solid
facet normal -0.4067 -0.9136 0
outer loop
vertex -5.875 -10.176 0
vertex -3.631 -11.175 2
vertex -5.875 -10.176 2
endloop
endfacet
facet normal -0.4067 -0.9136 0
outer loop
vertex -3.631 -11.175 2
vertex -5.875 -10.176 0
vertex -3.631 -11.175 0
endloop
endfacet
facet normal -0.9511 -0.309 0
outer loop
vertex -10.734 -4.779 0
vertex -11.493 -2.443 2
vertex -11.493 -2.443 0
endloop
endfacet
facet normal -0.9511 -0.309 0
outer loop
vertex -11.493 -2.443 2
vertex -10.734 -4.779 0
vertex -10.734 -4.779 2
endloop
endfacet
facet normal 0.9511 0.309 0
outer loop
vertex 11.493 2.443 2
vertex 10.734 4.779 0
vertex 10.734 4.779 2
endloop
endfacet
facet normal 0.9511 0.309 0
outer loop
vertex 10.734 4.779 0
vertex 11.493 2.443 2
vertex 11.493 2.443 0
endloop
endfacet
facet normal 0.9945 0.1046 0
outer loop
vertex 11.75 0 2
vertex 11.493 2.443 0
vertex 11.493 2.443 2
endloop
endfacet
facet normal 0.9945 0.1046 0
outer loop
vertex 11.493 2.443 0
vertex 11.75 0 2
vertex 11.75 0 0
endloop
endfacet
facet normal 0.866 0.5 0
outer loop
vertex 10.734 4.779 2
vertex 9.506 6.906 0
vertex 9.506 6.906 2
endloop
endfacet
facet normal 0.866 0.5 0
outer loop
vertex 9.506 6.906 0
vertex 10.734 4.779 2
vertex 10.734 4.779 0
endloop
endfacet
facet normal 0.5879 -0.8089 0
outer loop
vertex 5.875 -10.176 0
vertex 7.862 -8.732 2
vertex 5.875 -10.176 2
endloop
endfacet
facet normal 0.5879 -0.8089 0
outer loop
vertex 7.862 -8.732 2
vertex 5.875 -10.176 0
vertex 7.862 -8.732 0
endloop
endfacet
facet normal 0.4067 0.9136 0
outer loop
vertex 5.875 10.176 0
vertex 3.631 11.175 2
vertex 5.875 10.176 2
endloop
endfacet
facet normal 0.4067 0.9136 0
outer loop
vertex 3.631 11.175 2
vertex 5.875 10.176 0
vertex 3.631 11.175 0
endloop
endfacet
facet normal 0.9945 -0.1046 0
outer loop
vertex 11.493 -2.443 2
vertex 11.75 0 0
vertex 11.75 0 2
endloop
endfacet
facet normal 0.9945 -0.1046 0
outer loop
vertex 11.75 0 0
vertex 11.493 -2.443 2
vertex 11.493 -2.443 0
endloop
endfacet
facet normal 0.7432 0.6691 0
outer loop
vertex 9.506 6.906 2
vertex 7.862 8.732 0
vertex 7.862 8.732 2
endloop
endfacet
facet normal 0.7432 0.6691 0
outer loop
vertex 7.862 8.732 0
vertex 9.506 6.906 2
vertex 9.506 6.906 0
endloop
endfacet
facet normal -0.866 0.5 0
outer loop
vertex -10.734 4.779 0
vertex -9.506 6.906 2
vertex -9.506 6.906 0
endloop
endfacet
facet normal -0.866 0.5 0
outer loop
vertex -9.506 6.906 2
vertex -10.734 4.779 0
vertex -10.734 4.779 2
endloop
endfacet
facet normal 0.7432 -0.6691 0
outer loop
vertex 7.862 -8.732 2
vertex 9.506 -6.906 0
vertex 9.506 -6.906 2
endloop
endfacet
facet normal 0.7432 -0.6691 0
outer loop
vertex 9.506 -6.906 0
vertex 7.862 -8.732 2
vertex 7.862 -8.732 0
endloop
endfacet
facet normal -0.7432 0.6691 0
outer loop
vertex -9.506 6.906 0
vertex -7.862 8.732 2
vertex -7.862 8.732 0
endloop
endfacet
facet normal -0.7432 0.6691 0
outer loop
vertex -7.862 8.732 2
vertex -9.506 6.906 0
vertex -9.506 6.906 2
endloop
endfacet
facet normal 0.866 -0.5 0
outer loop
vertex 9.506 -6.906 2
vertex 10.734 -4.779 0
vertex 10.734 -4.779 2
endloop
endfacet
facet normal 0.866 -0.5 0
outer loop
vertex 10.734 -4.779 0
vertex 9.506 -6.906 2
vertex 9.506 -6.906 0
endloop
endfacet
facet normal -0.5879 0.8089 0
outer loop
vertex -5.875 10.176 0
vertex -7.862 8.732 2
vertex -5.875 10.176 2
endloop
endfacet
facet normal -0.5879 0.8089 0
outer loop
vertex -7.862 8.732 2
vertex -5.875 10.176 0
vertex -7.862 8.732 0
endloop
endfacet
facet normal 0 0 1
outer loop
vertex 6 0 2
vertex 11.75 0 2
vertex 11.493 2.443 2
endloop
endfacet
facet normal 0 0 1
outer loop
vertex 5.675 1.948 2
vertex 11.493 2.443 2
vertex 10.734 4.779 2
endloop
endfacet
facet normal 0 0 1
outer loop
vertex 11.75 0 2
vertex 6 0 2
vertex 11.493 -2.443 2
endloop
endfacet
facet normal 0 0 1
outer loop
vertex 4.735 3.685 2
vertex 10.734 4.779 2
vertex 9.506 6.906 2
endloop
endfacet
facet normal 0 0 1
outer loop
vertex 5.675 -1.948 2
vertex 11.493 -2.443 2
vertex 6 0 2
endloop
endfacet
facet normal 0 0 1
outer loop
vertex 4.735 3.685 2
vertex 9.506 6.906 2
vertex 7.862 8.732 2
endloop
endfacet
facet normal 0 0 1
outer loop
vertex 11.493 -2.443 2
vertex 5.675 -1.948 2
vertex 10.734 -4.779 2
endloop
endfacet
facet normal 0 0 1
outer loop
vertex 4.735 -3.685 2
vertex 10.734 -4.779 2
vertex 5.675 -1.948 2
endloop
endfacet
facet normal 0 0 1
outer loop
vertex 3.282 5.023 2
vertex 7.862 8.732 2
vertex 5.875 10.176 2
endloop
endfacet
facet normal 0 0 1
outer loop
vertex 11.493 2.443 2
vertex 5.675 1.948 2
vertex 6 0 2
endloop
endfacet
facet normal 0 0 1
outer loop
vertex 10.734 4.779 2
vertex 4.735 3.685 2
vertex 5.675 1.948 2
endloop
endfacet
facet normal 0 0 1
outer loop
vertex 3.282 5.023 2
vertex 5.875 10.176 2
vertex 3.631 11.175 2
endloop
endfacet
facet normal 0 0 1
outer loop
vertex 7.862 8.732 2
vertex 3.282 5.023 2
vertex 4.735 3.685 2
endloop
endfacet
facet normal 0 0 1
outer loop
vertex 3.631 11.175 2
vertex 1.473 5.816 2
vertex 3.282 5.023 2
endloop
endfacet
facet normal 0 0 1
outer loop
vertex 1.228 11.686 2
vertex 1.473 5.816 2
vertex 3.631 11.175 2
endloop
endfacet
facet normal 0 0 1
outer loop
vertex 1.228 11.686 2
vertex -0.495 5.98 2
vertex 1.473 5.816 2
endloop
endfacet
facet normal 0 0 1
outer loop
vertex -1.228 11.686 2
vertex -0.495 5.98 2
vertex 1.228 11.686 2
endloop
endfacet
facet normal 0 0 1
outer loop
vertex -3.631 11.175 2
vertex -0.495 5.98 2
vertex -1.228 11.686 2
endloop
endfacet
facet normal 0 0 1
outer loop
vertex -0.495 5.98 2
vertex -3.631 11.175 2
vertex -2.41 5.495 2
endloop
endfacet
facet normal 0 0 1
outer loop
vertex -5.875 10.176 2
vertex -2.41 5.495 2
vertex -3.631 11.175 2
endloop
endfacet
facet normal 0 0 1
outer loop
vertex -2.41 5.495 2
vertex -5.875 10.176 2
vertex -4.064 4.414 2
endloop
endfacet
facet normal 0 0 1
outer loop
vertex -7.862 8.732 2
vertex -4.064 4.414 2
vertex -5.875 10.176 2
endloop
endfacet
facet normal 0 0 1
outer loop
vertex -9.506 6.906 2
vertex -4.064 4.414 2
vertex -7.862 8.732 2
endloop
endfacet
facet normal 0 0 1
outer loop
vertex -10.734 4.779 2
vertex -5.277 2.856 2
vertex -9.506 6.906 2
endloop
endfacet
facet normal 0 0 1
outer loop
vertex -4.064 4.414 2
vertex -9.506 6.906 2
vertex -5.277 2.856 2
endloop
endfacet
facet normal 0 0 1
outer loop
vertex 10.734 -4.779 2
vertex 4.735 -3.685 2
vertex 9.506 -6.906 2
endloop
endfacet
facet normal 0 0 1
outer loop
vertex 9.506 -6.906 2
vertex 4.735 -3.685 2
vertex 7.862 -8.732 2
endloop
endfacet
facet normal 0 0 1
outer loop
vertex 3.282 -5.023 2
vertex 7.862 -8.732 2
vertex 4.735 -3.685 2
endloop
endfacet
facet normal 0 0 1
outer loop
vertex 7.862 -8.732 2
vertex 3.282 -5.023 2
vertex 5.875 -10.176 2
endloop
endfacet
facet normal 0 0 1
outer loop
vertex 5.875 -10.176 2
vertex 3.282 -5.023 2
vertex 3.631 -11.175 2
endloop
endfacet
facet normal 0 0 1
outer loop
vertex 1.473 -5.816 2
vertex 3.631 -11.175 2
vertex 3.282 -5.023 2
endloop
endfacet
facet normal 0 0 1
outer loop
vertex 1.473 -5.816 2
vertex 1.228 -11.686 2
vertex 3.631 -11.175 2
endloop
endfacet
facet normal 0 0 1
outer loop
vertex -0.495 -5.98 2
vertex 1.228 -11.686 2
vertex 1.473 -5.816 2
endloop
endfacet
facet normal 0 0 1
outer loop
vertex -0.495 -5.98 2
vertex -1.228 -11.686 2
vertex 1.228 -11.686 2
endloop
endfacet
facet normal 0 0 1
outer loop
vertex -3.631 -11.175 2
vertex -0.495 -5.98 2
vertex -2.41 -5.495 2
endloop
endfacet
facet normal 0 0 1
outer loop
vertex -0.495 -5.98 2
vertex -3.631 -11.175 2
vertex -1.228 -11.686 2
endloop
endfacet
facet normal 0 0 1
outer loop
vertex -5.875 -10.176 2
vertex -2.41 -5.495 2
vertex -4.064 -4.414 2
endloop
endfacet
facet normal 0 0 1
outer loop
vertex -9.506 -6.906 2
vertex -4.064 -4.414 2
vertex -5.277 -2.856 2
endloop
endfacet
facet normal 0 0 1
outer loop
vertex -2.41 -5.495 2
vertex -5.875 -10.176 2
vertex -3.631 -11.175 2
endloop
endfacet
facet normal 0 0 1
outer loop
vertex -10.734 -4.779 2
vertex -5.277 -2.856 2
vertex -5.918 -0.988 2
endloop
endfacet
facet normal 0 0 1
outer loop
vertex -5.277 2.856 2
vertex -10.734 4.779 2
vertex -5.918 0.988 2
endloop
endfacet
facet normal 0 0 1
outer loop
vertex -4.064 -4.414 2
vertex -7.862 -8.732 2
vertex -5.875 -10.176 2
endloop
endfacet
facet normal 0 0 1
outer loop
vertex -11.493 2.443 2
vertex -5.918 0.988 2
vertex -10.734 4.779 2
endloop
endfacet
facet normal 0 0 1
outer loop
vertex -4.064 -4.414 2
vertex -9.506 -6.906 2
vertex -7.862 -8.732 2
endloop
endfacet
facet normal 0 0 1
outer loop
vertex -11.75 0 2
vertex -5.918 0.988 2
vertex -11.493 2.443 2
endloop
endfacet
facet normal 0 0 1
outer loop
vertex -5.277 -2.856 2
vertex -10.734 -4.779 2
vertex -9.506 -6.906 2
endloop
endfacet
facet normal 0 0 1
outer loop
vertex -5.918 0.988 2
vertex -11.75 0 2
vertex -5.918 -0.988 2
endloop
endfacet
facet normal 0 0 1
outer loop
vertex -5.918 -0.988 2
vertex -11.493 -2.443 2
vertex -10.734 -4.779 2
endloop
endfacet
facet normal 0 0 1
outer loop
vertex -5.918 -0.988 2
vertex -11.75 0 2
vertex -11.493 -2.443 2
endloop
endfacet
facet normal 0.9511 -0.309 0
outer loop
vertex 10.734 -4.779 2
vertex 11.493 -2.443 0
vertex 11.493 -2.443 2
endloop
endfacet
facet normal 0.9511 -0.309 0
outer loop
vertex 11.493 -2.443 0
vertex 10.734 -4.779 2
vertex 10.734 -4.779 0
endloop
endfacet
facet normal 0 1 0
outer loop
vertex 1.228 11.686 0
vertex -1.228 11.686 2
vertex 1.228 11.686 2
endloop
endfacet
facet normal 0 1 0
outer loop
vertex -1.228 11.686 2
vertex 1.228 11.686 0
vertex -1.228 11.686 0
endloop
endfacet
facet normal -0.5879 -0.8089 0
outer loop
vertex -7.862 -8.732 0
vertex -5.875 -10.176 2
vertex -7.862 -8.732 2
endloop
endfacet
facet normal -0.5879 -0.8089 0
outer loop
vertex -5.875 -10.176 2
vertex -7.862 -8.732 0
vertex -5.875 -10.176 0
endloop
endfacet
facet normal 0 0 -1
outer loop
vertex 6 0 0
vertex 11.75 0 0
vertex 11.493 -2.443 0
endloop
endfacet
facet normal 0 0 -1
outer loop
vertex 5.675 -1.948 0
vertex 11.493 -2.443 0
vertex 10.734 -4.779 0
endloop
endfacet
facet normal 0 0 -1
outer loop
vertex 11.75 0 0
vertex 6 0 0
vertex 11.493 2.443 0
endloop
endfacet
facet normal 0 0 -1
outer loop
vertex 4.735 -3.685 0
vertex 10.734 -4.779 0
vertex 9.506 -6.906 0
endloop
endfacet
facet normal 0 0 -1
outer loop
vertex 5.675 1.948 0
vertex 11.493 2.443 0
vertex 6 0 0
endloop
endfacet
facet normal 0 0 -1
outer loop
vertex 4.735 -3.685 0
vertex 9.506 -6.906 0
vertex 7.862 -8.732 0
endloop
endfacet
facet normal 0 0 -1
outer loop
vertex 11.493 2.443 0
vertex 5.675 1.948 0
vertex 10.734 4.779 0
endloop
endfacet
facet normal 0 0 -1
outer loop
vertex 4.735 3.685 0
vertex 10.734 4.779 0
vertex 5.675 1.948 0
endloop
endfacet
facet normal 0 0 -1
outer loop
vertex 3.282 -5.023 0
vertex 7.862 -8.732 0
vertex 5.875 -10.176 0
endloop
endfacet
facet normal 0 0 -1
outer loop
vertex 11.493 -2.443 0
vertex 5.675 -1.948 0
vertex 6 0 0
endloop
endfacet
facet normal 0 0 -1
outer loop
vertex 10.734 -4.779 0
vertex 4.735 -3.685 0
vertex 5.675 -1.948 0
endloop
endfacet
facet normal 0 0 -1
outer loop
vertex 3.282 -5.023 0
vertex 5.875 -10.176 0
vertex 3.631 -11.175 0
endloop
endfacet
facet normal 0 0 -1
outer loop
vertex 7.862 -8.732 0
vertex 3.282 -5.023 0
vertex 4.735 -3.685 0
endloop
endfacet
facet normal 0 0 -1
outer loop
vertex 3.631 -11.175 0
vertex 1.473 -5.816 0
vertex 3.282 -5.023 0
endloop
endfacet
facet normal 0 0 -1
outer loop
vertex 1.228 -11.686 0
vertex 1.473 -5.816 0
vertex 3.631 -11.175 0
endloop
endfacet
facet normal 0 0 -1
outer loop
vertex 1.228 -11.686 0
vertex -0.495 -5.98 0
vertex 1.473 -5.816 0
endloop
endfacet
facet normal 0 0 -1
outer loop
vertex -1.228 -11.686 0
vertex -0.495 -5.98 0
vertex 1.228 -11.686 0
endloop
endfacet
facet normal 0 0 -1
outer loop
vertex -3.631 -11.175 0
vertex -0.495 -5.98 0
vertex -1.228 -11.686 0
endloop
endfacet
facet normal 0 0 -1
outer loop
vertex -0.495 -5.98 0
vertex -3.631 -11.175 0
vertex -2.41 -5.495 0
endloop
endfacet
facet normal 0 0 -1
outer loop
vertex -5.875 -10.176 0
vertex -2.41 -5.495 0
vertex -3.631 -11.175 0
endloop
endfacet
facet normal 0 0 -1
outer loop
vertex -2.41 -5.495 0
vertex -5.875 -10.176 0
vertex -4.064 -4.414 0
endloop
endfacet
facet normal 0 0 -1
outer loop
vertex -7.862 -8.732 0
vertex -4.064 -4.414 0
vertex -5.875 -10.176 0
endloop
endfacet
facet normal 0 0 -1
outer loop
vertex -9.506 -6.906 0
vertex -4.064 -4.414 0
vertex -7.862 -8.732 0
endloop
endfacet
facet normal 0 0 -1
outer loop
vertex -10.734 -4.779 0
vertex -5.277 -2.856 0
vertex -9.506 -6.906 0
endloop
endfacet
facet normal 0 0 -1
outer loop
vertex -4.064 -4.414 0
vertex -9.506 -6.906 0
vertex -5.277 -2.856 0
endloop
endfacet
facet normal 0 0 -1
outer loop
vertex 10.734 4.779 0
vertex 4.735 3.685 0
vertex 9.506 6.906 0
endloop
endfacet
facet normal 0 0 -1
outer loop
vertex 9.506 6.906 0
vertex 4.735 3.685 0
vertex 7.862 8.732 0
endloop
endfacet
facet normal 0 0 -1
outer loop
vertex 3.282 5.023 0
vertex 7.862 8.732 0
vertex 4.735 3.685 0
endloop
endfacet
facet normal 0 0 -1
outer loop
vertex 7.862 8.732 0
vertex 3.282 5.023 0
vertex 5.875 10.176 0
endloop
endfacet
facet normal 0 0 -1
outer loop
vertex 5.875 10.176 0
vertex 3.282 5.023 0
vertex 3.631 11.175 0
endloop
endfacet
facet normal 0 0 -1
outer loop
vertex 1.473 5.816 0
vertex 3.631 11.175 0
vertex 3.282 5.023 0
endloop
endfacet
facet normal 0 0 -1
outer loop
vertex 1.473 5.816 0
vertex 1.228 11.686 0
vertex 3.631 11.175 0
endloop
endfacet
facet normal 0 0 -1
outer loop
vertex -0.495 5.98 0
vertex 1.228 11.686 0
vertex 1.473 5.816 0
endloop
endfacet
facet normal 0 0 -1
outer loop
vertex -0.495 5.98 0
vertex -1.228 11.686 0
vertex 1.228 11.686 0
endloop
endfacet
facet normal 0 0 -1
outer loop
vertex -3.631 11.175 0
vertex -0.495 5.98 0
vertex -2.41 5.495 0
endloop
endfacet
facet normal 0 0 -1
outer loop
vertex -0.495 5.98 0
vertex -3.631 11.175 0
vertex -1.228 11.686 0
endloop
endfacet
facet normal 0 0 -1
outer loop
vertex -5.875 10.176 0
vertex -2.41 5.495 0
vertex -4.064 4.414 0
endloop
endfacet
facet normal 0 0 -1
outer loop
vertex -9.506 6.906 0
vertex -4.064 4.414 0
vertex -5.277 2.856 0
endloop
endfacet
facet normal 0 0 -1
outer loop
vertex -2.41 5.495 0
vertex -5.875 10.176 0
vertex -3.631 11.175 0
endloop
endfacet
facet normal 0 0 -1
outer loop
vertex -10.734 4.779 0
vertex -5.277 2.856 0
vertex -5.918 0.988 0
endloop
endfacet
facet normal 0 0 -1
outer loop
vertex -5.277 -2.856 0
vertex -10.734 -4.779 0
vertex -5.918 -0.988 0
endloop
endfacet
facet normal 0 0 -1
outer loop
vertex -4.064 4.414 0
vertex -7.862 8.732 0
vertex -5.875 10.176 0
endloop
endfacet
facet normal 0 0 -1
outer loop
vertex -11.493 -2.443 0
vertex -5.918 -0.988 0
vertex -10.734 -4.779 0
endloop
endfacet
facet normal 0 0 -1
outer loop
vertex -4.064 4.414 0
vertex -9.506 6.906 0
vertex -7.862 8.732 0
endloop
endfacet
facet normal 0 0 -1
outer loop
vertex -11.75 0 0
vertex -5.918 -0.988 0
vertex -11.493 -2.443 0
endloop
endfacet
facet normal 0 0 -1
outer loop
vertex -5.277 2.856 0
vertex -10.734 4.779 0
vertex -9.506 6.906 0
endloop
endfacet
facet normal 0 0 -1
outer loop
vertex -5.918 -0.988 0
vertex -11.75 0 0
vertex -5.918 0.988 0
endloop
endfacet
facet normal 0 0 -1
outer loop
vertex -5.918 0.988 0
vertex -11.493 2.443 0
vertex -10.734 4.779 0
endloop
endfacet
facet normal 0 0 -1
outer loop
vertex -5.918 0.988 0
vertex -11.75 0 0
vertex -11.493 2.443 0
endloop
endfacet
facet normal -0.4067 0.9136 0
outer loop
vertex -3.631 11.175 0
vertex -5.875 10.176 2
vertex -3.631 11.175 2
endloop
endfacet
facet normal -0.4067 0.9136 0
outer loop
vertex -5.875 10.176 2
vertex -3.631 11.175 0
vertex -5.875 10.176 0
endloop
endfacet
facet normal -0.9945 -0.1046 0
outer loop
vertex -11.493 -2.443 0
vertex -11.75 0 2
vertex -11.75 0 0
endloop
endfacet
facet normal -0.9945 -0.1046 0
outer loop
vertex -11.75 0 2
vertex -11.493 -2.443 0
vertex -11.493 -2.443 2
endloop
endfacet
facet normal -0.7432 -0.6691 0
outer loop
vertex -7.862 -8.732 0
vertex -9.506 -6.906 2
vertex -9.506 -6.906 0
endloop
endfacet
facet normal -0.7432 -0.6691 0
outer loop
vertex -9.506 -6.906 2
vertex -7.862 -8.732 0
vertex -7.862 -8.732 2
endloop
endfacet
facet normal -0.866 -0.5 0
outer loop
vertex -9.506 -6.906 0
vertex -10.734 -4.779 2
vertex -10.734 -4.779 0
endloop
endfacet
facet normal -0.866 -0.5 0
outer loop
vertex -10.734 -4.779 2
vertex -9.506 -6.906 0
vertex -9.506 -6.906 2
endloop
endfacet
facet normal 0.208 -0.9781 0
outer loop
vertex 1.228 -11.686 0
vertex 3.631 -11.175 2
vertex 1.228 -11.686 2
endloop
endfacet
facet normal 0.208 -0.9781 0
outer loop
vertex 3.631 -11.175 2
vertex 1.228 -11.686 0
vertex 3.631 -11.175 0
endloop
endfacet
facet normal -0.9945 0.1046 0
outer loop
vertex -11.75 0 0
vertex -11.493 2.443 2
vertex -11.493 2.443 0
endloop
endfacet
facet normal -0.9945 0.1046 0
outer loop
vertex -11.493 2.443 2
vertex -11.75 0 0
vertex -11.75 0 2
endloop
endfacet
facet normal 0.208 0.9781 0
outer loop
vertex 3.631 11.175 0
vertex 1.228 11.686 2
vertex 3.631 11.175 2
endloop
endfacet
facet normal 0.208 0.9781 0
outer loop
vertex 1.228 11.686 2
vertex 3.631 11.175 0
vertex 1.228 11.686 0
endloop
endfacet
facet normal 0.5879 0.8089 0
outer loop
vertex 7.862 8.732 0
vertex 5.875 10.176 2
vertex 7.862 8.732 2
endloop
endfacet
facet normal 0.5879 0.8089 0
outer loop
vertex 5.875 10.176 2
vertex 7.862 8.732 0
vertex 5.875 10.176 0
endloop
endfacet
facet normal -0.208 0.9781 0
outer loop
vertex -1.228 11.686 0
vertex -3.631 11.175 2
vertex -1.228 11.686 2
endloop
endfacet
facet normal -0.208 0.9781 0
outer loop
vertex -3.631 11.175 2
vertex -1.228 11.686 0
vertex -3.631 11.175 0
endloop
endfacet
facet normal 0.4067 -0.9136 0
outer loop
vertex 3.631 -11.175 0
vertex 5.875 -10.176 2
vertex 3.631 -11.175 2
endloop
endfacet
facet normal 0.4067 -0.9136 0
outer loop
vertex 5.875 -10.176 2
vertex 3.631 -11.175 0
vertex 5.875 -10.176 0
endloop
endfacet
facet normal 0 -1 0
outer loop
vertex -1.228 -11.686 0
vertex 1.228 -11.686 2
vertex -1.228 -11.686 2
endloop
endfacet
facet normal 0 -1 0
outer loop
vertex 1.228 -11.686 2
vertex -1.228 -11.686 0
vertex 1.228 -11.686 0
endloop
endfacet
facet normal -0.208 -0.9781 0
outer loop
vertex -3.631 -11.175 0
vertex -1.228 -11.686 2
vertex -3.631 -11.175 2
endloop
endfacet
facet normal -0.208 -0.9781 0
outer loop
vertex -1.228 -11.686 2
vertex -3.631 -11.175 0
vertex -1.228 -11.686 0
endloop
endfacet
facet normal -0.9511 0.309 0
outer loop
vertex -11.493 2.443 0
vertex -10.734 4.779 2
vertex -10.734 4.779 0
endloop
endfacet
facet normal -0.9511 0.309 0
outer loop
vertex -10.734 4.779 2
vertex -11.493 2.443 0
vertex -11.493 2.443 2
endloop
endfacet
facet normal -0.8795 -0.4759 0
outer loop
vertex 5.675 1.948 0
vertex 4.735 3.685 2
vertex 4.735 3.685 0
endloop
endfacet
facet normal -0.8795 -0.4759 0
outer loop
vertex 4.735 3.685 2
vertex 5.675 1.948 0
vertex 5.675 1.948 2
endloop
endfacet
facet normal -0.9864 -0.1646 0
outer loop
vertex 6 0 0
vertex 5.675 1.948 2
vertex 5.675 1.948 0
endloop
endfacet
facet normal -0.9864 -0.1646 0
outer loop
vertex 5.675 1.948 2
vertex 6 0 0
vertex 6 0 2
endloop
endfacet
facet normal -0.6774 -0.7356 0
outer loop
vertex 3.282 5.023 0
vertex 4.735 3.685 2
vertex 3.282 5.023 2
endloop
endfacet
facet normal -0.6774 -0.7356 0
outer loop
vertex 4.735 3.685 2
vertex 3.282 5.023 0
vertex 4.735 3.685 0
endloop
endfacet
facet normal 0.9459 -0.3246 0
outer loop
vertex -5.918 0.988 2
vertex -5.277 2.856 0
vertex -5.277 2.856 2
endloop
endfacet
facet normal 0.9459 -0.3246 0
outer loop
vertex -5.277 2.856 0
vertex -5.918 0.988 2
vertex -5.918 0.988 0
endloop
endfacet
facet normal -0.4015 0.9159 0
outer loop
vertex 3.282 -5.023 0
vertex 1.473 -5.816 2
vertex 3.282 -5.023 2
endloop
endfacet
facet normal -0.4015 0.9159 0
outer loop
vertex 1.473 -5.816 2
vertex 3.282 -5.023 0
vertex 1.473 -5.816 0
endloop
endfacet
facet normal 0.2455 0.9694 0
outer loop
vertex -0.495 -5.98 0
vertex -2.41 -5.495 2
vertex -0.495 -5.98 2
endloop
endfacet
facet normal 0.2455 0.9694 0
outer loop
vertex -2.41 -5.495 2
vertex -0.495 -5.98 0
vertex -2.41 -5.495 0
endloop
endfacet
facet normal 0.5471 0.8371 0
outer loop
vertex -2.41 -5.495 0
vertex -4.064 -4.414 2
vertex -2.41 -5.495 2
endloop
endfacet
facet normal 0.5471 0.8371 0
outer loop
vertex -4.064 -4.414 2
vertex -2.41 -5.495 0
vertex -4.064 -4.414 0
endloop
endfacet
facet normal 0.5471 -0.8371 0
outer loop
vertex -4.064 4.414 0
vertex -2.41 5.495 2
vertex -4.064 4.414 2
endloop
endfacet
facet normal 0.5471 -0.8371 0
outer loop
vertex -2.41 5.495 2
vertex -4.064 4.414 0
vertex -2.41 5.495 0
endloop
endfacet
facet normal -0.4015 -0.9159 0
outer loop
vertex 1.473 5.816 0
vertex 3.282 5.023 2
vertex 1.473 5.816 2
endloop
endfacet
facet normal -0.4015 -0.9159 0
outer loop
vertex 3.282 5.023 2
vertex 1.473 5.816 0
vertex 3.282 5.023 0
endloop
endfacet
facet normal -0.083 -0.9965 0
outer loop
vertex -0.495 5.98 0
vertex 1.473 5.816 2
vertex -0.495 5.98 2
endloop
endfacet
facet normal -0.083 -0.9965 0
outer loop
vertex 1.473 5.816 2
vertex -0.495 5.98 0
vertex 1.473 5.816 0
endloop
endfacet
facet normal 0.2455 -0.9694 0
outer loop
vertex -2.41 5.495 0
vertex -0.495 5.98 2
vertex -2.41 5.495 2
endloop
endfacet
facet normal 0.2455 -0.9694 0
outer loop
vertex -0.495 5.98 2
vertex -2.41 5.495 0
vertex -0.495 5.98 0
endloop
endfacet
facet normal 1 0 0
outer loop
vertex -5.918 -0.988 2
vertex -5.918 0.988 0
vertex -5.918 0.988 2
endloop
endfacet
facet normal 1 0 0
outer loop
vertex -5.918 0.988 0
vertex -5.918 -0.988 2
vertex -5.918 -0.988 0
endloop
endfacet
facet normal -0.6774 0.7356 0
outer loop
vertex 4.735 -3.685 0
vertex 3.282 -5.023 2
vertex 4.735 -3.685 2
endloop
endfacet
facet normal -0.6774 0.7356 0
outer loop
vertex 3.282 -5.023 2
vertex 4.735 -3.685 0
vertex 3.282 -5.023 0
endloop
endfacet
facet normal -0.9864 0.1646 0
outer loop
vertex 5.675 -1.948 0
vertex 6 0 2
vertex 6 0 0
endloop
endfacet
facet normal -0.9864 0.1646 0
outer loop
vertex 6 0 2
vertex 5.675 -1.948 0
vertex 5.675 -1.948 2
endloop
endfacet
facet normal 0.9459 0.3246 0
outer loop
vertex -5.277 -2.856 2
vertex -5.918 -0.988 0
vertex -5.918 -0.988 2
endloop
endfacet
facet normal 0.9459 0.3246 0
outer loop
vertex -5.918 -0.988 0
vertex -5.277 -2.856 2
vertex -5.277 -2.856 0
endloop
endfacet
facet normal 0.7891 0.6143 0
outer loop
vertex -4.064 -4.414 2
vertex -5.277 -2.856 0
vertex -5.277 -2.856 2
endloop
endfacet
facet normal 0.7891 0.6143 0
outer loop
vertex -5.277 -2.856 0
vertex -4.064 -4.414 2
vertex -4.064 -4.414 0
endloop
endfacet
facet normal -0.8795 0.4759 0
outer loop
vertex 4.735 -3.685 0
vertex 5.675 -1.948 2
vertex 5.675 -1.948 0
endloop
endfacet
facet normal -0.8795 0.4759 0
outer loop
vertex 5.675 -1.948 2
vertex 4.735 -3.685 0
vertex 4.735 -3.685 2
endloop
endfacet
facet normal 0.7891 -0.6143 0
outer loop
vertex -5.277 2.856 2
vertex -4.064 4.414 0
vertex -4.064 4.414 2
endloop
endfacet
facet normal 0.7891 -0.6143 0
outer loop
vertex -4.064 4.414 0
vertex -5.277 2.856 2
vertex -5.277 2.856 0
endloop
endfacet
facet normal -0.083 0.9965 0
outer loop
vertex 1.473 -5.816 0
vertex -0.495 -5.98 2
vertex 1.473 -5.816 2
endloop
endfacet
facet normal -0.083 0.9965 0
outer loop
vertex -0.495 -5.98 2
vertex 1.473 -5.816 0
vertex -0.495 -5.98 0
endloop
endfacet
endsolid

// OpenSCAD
// This is a model of a sealing washer. 
// They are commonly sold for the inlet hoses of washing machines and dish washers
// E.g. Screwfix 6039J
// It is not meant to be 3d printed, is is only meant as a visual aid in assembly models



epsilon = 0.01;

module Washer6039J()
{
    color("grey")
    difference()
    {
        union()
        {
            cylinder(d=23.5,h=2);
        }
        union()
        {
            translate([0,0,-epsilon])
            {
                cylinder(d=12,h=2+2*epsilon);
            }
        }
    }
    
}

Washer6039J();
